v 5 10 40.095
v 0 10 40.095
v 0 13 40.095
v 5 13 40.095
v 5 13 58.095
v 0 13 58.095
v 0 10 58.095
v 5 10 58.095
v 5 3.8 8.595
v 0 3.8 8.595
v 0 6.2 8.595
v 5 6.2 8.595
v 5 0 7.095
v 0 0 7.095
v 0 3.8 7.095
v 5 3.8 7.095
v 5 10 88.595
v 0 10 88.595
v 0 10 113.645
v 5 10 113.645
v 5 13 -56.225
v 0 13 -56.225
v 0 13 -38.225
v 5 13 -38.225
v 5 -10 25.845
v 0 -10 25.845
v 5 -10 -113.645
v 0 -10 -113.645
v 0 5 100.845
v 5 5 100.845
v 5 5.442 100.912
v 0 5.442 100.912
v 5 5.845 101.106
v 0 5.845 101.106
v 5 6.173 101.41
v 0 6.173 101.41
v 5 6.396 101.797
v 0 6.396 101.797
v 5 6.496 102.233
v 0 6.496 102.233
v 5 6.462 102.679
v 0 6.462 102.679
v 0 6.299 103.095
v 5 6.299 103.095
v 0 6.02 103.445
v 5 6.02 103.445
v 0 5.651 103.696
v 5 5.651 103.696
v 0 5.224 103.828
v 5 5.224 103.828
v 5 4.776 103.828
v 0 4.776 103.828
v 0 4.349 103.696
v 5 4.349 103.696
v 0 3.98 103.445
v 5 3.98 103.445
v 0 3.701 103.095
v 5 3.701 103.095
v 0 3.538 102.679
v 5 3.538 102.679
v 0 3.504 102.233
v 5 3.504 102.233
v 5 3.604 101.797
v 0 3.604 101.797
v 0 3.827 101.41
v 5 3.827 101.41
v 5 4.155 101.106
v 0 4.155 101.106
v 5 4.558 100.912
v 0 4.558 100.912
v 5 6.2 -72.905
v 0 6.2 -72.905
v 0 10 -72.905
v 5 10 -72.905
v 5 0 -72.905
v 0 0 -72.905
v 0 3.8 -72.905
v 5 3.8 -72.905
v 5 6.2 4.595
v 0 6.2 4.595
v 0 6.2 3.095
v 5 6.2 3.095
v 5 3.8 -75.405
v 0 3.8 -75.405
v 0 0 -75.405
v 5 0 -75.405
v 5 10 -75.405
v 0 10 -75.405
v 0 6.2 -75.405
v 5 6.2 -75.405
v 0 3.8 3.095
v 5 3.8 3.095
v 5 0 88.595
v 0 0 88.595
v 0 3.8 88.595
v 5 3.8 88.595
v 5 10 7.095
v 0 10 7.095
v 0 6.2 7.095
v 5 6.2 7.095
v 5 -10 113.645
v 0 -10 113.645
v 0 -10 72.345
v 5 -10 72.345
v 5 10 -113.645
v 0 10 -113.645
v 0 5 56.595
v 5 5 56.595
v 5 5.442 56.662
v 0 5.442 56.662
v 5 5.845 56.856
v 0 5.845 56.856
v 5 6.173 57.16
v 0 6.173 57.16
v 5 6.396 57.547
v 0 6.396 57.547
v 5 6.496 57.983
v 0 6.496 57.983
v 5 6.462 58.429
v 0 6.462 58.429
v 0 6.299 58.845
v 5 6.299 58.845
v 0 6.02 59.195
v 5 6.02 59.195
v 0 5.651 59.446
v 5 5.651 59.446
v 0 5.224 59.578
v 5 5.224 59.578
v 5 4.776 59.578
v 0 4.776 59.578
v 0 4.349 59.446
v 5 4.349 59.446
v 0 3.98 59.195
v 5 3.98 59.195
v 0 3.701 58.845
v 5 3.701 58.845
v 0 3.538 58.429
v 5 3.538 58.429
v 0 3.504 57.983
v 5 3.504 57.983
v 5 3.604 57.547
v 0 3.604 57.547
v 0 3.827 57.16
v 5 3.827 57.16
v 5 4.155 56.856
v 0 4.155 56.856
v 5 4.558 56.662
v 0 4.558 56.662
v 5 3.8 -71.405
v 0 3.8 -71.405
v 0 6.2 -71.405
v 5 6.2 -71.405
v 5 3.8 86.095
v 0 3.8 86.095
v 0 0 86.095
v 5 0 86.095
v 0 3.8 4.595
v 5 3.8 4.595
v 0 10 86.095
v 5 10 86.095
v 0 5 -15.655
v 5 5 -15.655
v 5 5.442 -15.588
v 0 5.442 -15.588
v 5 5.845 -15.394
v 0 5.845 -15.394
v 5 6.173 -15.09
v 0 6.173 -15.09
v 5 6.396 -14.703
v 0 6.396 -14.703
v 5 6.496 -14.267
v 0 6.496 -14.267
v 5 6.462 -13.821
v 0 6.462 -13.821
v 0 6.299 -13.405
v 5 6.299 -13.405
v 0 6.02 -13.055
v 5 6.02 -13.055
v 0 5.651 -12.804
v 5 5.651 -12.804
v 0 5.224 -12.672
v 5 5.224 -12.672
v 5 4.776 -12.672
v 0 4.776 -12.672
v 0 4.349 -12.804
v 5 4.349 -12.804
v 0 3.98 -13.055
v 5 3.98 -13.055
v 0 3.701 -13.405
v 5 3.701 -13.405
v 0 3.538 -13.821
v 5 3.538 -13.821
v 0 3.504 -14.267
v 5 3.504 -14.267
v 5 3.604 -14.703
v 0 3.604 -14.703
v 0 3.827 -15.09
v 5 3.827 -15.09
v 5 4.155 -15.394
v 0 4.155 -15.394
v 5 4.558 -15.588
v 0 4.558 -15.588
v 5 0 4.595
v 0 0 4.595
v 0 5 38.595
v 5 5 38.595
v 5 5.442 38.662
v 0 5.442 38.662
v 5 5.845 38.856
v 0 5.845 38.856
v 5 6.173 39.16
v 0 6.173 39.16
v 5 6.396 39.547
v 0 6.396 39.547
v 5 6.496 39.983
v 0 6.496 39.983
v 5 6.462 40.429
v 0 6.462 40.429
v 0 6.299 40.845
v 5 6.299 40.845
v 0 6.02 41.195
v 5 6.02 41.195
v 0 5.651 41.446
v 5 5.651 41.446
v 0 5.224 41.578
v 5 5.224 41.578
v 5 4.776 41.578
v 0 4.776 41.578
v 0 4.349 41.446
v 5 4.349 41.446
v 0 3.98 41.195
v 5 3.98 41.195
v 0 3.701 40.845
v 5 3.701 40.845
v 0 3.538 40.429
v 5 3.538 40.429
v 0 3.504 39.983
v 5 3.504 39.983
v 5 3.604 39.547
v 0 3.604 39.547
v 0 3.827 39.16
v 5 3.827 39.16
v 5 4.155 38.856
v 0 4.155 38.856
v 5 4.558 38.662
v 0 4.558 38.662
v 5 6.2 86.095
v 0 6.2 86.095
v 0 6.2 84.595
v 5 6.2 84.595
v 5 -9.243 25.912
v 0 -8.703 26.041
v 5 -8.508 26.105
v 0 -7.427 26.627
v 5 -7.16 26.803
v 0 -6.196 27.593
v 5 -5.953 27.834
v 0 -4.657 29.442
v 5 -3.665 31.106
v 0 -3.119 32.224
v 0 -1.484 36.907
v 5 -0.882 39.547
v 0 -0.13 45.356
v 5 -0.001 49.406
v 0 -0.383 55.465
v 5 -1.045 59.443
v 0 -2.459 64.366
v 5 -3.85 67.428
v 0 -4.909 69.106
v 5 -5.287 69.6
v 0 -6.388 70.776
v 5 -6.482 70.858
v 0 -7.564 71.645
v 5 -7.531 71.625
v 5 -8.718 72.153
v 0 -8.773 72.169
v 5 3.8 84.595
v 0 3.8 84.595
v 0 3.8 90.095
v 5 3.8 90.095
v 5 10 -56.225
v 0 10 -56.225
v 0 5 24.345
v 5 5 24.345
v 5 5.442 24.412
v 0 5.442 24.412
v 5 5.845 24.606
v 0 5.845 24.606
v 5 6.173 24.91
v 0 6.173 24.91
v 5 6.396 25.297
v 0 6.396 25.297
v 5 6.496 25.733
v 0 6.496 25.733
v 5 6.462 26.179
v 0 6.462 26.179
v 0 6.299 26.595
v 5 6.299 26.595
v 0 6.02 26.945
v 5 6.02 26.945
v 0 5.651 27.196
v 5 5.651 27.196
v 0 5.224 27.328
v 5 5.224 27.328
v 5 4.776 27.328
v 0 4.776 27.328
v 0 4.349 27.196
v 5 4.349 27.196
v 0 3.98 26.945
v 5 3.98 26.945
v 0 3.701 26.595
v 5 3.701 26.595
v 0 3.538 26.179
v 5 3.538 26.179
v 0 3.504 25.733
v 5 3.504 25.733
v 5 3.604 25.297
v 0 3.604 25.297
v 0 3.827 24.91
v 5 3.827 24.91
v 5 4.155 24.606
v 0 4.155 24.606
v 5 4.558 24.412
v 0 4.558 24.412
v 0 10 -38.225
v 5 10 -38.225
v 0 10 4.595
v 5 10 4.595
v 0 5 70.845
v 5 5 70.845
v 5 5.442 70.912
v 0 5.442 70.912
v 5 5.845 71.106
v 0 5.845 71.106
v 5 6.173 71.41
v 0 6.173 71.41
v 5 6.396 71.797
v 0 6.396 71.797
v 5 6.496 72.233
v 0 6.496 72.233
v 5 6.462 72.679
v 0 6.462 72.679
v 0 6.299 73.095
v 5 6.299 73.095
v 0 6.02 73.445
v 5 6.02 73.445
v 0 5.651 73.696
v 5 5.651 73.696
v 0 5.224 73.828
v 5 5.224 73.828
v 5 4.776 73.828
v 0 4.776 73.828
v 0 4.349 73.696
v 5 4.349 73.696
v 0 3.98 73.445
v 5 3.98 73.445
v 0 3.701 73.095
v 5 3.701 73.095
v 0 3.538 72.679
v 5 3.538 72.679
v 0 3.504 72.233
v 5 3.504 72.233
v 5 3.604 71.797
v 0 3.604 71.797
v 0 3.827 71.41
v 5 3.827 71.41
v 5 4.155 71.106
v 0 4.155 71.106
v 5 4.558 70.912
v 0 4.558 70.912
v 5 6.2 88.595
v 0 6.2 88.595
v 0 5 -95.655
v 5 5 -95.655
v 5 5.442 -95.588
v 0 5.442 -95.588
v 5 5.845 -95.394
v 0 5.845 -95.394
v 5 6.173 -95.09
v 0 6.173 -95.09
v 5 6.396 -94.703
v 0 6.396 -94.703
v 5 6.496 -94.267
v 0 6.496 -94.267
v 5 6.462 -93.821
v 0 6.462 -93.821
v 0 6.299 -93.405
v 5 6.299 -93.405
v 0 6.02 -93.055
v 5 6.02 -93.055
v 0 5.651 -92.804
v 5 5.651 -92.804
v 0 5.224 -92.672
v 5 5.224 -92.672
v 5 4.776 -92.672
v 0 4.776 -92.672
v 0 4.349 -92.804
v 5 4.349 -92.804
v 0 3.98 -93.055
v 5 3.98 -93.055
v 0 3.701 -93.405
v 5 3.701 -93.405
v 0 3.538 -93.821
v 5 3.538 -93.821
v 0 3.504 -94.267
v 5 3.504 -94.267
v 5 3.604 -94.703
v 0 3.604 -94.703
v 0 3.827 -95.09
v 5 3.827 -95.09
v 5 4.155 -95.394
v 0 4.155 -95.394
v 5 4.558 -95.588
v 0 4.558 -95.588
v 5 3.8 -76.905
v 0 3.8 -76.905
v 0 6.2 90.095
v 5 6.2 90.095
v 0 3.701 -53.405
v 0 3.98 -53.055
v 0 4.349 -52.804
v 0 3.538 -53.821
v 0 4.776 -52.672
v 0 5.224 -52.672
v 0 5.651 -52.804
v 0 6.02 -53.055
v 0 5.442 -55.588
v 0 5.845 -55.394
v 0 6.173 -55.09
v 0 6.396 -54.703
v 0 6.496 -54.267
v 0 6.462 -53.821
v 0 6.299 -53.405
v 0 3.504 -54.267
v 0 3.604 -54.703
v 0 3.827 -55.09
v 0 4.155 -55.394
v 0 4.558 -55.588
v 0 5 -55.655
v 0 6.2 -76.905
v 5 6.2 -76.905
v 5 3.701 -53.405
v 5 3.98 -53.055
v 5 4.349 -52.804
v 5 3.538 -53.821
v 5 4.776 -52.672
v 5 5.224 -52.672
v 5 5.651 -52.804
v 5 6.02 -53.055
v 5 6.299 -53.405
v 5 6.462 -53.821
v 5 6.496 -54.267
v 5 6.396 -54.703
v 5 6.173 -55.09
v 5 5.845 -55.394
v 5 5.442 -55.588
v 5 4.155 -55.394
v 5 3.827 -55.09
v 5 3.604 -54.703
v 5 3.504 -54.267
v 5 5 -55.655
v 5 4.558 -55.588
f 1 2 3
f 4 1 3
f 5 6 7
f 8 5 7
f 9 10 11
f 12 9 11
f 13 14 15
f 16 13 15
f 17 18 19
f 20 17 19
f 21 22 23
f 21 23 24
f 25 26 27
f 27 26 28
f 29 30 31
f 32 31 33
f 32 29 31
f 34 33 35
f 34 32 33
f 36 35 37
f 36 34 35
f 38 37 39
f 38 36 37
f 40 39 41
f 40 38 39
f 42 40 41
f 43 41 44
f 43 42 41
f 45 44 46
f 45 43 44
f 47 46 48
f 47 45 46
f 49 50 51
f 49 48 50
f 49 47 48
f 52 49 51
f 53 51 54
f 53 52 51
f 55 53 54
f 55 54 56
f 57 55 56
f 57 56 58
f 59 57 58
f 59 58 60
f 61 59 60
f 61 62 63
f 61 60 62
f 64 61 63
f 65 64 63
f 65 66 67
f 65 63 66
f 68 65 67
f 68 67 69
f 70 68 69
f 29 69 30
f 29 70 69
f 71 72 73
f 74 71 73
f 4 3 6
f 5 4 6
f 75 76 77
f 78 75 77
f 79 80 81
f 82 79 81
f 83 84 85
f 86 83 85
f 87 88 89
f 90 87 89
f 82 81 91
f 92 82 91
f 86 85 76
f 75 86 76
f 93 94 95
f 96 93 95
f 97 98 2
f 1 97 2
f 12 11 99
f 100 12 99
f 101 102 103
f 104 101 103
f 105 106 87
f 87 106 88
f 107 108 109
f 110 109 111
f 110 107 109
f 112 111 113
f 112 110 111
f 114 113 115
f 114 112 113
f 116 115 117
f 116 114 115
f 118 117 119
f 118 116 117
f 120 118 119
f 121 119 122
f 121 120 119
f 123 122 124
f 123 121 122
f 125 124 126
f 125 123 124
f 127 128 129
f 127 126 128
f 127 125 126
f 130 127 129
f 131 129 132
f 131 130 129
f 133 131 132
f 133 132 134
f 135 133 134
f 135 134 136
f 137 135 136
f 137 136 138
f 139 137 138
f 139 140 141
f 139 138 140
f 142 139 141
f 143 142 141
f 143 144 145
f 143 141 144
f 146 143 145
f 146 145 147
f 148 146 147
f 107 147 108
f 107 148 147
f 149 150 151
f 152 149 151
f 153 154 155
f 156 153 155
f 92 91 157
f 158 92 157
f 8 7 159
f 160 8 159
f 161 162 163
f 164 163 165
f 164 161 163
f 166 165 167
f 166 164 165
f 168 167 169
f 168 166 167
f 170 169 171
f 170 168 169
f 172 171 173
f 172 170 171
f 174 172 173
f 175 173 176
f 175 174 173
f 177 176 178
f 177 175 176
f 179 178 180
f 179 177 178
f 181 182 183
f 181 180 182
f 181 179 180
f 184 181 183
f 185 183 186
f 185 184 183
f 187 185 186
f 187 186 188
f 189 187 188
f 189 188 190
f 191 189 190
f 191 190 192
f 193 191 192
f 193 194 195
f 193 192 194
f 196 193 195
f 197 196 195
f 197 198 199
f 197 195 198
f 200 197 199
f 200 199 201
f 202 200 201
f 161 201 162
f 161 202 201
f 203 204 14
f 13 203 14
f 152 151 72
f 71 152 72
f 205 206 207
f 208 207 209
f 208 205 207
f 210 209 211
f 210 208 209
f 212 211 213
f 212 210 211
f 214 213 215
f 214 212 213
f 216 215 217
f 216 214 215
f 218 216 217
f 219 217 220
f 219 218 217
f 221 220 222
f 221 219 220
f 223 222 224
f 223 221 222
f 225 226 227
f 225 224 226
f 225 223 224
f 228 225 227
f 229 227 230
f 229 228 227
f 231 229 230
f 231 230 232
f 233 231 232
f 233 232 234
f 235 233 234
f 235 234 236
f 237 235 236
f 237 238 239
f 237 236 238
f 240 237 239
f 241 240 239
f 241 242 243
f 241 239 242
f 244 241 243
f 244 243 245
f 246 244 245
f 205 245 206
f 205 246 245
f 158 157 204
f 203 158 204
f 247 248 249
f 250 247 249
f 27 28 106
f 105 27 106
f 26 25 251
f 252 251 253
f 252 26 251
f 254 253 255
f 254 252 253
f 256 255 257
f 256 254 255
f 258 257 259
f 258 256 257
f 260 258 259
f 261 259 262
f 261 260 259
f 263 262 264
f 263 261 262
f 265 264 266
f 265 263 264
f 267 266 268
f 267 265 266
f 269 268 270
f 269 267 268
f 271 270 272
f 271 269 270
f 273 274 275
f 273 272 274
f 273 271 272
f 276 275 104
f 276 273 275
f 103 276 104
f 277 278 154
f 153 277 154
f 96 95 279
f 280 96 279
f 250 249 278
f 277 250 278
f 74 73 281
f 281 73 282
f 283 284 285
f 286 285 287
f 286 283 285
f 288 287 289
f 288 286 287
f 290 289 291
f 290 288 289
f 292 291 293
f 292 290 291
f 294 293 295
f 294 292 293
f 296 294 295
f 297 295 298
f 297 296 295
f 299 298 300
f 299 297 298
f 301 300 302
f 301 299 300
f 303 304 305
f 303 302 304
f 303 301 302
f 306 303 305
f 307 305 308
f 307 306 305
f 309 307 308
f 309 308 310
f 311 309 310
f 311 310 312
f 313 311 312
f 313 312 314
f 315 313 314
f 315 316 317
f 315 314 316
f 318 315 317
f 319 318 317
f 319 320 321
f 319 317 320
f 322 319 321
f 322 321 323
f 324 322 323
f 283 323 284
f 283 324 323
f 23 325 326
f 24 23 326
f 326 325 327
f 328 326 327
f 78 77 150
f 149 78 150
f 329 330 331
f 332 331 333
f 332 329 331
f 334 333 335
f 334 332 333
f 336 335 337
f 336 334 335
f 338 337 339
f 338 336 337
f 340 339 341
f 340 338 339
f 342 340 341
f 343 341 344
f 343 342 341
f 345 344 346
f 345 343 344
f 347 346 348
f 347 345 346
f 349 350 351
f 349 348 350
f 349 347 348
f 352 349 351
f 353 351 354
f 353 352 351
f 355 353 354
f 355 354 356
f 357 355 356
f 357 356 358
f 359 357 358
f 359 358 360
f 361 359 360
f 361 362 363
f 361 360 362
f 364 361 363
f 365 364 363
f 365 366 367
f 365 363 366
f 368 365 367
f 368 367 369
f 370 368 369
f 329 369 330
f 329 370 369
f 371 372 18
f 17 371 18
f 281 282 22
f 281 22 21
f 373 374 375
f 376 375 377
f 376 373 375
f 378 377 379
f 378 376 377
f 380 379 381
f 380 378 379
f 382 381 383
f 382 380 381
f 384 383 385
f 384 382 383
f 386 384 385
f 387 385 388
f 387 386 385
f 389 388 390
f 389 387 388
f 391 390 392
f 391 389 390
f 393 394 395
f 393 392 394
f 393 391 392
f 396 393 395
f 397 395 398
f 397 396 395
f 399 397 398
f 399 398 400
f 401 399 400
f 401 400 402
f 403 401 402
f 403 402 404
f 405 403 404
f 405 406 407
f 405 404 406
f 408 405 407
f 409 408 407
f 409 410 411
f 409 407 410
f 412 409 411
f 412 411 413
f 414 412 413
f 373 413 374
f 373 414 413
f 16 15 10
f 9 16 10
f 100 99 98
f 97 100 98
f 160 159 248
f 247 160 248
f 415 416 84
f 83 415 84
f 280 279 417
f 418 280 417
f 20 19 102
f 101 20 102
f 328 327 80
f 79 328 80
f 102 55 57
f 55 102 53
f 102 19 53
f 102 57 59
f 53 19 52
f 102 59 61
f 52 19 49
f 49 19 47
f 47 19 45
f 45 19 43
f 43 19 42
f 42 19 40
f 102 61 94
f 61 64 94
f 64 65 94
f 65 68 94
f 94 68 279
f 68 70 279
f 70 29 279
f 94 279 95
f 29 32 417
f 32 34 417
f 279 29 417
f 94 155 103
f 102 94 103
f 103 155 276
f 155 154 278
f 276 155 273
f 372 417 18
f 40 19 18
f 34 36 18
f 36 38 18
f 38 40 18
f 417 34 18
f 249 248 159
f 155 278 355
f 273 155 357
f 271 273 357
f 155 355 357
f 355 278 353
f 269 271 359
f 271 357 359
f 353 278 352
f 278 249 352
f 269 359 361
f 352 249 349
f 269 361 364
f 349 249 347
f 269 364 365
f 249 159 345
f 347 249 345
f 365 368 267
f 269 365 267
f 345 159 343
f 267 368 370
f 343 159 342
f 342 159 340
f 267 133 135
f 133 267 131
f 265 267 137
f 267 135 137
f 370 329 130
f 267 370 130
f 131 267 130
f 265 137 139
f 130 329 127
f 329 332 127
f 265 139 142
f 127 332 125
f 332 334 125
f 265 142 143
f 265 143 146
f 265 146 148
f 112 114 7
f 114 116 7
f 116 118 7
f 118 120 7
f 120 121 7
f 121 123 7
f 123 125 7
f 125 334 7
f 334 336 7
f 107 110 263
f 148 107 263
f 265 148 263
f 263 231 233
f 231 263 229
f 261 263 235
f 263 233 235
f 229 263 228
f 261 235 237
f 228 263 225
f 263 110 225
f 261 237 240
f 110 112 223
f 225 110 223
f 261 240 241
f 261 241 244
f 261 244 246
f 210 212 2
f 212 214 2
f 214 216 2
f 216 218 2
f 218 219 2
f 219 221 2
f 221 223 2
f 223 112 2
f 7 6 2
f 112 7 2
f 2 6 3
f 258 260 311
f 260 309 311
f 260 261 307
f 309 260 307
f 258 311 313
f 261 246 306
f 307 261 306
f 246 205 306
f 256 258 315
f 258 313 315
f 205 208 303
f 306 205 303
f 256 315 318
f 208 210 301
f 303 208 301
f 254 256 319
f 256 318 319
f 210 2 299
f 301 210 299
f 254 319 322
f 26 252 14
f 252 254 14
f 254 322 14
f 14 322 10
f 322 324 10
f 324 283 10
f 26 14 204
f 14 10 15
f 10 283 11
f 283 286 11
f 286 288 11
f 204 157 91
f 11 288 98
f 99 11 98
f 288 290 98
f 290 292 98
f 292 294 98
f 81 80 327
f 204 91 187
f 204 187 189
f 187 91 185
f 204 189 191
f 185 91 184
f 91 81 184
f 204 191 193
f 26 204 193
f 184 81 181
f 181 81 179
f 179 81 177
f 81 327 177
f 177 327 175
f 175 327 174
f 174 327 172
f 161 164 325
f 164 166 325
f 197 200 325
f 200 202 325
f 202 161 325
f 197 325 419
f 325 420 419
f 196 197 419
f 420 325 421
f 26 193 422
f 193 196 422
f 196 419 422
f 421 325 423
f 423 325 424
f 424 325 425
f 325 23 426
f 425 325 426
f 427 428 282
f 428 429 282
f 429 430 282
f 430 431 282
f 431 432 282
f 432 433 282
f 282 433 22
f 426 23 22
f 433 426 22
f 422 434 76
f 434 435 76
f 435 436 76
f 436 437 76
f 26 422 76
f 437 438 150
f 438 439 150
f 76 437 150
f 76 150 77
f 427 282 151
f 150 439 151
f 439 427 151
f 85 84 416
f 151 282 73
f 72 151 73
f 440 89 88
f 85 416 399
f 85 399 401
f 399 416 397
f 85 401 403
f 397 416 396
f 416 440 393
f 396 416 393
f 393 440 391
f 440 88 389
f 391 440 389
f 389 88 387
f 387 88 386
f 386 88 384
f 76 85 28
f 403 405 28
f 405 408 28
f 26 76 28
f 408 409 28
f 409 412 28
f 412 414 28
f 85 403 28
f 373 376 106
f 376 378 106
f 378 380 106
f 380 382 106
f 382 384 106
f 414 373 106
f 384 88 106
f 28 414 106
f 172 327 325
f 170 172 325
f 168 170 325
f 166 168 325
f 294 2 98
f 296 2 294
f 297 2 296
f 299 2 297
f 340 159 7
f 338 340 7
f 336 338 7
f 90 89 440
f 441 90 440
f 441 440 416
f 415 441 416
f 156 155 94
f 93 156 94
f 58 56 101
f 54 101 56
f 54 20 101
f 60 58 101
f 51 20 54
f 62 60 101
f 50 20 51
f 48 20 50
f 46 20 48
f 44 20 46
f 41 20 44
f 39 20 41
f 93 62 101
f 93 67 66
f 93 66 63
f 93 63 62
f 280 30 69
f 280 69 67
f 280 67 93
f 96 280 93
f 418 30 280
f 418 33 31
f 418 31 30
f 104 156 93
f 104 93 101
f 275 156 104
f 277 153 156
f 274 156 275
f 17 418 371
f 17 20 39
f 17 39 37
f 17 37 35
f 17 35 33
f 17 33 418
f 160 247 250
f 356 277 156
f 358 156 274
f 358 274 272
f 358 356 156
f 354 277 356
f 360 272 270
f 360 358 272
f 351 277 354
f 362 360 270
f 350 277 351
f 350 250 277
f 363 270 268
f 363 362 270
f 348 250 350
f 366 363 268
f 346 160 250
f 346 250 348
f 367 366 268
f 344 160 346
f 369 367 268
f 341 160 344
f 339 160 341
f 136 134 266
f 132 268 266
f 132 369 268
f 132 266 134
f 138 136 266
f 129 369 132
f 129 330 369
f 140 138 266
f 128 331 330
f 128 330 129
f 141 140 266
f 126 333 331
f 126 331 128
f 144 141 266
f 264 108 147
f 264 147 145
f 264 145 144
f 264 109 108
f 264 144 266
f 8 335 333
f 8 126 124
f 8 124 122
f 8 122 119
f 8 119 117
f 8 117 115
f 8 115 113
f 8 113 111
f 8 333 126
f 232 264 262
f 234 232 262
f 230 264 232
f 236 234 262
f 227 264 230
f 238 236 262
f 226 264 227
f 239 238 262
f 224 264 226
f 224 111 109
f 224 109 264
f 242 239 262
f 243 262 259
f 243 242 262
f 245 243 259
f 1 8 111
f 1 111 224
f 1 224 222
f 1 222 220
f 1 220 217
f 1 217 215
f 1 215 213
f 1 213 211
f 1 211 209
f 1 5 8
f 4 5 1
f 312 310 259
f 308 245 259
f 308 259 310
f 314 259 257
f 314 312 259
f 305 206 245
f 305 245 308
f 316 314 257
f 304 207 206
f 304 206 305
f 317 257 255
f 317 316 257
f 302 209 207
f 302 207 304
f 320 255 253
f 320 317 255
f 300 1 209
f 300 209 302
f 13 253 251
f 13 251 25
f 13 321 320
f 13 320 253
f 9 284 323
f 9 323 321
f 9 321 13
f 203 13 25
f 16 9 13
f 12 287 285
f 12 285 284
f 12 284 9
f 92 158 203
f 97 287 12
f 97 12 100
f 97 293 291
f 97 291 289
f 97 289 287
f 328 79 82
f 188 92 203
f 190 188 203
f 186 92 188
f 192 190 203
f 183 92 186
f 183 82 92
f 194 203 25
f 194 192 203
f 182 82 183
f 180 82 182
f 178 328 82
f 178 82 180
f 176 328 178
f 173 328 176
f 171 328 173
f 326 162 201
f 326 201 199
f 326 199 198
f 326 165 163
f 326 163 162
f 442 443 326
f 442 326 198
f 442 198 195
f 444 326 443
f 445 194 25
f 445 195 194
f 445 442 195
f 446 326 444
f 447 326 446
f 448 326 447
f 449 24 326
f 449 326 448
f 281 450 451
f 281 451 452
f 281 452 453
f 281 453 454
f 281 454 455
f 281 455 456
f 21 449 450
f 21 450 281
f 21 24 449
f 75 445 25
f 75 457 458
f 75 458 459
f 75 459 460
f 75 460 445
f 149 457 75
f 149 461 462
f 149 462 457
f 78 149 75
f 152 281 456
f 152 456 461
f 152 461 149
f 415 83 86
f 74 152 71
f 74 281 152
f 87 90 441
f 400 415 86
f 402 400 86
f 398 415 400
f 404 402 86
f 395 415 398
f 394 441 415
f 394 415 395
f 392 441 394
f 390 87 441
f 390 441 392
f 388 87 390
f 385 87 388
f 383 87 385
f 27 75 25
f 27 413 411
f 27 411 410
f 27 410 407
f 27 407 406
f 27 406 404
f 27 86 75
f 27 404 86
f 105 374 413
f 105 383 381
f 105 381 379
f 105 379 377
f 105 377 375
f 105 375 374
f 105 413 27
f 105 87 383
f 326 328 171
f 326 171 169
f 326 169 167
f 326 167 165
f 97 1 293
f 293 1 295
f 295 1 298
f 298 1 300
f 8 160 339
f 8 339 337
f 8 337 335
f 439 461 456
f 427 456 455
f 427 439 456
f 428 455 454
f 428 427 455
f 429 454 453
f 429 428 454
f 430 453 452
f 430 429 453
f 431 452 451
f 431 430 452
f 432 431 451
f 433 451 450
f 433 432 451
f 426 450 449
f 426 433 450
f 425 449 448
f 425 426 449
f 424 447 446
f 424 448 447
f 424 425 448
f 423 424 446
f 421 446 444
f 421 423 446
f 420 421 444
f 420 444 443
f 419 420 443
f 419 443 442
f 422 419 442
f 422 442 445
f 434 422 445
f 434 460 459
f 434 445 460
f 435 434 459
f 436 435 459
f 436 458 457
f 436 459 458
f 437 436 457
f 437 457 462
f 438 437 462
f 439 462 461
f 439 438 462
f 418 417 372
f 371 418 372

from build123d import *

# Parameters (mm, degrees)
ESTRUSIONE_ESTRUSIONE1_DEPTH = 5
SCHIZZO3_R                   = 1.5
SCHIZZO3_RX                  = 23.25
SCHIZZO3_RY                  = 10
TAGLIO_ESTRUSIONE1_DEPTH     = 6
TAGLIO_ESTRUSIONE2_DEPTH     = 6.0000001
SCHIZZO6_W                   = 5
SCHIZZO6_H                   = 18
ESTRUSIONE_ESTRUSIONE2_DEPTH = 3


with BuildPart() as part:
    # Schizzo1 → Estrusione-Estrusione1 (new body)
    with BuildSketch(Plane(origin=(0, 0, 0), x_dir=(0, 0, -1), z_dir=(1, 0, 0))):
        Polygon((-113.645, -10), (113.645, -10), (113.645, 10), (-40.095, 10), (-40.095, 13), (-58.095, 13), (-58.095, 10), (-113.645, 10), align=None)
    extrude(amount=ESTRUSIONE_ESTRUSIONE1_DEPTH)

    # Schizzo3 → Taglio-Estrusione1 (cut, through all)
    with BuildSketch(Plane(origin=(0, 0, 0), x_dir=(0, 0, -1), z_dir=(1, 0, 0))):
        with Locations((-58.095, 5)):
            Circle(SCHIZZO3_R)
        with Locations((-72.345, 5)):
            Circle(SCHIZZO3_R)
        with Locations((-40.095, 5)):
            Circle(SCHIZZO3_R)
        with Locations((-25.845, 5)):
            Circle(SCHIZZO3_R)
        with Locations((14.155, 5)):
            Circle(SCHIZZO3_R)
        with Locations((54.155, 5)):
            Circle(SCHIZZO3_R)
        with Locations((94.155, 5)):
            Circle(SCHIZZO3_R)
        with Locations((-102.345, 5)):
            Circle(SCHIZZO3_R)
        with Locations(Location((-49.095, -10), (0, 0, 0))):
            Ellipse(SCHIZZO3_RX, SCHIZZO3_RY)
    extrude(amount=TAGLIO_ESTRUSIONE1_DEPTH, mode=Mode.SUBTRACT)

    # Schizzo5 → Taglio-Estrusione2 (cut, through all)
    with BuildSketch(Plane(origin=(0, 0, 0), x_dir=(0, 0, -1), z_dir=(1, 0, 0))):
        Polygon((-88.595, 0), (-88.595, 3.8), (-90.095, 3.8), (-90.095, 6.2), (-88.595, 6.2), (-88.595, 10), (-86.095, 10), (-86.095, 6.2), (-84.595, 6.2), (-84.595, 3.8), (-86.095, 3.8), (-86.095, 0), align=None)
        Polygon((-7.095, 0), (-7.095, 3.8), (-8.595, 3.8), (-8.595, 6.2), (-7.095, 6.2), (-7.095, 10), (-4.595, 10), (-4.595, 6.2), (-3.095, 6.2), (-3.095, 3.8), (-4.595, 3.8), (-4.595, 0), align=None)
        Polygon((72.905, 0), (72.905, 3.8), (71.405, 3.8), (71.405, 6.2), (72.905, 6.2), (72.905, 10), (75.405, 10), (75.405, 6.2), (76.905, 6.2), (76.905, 3.8), (75.405, 3.8), (75.405, 0), align=None)
    extrude(amount=TAGLIO_ESTRUSIONE2_DEPTH, mode=Mode.SUBTRACT)

    # Schizzo6 → Estrusione-Estrusione2 (add)
    with BuildSketch(Plane(origin=(0, 10, 0), x_dir=(1, 0, 0), z_dir=(0, 1, 0))):
        with Locations((2.5, 47.225)):
            Rectangle(SCHIZZO6_W, SCHIZZO6_H)
    extrude(amount=ESTRUSIONE_ESTRUSIONE2_DEPTH)


solid = part.part
